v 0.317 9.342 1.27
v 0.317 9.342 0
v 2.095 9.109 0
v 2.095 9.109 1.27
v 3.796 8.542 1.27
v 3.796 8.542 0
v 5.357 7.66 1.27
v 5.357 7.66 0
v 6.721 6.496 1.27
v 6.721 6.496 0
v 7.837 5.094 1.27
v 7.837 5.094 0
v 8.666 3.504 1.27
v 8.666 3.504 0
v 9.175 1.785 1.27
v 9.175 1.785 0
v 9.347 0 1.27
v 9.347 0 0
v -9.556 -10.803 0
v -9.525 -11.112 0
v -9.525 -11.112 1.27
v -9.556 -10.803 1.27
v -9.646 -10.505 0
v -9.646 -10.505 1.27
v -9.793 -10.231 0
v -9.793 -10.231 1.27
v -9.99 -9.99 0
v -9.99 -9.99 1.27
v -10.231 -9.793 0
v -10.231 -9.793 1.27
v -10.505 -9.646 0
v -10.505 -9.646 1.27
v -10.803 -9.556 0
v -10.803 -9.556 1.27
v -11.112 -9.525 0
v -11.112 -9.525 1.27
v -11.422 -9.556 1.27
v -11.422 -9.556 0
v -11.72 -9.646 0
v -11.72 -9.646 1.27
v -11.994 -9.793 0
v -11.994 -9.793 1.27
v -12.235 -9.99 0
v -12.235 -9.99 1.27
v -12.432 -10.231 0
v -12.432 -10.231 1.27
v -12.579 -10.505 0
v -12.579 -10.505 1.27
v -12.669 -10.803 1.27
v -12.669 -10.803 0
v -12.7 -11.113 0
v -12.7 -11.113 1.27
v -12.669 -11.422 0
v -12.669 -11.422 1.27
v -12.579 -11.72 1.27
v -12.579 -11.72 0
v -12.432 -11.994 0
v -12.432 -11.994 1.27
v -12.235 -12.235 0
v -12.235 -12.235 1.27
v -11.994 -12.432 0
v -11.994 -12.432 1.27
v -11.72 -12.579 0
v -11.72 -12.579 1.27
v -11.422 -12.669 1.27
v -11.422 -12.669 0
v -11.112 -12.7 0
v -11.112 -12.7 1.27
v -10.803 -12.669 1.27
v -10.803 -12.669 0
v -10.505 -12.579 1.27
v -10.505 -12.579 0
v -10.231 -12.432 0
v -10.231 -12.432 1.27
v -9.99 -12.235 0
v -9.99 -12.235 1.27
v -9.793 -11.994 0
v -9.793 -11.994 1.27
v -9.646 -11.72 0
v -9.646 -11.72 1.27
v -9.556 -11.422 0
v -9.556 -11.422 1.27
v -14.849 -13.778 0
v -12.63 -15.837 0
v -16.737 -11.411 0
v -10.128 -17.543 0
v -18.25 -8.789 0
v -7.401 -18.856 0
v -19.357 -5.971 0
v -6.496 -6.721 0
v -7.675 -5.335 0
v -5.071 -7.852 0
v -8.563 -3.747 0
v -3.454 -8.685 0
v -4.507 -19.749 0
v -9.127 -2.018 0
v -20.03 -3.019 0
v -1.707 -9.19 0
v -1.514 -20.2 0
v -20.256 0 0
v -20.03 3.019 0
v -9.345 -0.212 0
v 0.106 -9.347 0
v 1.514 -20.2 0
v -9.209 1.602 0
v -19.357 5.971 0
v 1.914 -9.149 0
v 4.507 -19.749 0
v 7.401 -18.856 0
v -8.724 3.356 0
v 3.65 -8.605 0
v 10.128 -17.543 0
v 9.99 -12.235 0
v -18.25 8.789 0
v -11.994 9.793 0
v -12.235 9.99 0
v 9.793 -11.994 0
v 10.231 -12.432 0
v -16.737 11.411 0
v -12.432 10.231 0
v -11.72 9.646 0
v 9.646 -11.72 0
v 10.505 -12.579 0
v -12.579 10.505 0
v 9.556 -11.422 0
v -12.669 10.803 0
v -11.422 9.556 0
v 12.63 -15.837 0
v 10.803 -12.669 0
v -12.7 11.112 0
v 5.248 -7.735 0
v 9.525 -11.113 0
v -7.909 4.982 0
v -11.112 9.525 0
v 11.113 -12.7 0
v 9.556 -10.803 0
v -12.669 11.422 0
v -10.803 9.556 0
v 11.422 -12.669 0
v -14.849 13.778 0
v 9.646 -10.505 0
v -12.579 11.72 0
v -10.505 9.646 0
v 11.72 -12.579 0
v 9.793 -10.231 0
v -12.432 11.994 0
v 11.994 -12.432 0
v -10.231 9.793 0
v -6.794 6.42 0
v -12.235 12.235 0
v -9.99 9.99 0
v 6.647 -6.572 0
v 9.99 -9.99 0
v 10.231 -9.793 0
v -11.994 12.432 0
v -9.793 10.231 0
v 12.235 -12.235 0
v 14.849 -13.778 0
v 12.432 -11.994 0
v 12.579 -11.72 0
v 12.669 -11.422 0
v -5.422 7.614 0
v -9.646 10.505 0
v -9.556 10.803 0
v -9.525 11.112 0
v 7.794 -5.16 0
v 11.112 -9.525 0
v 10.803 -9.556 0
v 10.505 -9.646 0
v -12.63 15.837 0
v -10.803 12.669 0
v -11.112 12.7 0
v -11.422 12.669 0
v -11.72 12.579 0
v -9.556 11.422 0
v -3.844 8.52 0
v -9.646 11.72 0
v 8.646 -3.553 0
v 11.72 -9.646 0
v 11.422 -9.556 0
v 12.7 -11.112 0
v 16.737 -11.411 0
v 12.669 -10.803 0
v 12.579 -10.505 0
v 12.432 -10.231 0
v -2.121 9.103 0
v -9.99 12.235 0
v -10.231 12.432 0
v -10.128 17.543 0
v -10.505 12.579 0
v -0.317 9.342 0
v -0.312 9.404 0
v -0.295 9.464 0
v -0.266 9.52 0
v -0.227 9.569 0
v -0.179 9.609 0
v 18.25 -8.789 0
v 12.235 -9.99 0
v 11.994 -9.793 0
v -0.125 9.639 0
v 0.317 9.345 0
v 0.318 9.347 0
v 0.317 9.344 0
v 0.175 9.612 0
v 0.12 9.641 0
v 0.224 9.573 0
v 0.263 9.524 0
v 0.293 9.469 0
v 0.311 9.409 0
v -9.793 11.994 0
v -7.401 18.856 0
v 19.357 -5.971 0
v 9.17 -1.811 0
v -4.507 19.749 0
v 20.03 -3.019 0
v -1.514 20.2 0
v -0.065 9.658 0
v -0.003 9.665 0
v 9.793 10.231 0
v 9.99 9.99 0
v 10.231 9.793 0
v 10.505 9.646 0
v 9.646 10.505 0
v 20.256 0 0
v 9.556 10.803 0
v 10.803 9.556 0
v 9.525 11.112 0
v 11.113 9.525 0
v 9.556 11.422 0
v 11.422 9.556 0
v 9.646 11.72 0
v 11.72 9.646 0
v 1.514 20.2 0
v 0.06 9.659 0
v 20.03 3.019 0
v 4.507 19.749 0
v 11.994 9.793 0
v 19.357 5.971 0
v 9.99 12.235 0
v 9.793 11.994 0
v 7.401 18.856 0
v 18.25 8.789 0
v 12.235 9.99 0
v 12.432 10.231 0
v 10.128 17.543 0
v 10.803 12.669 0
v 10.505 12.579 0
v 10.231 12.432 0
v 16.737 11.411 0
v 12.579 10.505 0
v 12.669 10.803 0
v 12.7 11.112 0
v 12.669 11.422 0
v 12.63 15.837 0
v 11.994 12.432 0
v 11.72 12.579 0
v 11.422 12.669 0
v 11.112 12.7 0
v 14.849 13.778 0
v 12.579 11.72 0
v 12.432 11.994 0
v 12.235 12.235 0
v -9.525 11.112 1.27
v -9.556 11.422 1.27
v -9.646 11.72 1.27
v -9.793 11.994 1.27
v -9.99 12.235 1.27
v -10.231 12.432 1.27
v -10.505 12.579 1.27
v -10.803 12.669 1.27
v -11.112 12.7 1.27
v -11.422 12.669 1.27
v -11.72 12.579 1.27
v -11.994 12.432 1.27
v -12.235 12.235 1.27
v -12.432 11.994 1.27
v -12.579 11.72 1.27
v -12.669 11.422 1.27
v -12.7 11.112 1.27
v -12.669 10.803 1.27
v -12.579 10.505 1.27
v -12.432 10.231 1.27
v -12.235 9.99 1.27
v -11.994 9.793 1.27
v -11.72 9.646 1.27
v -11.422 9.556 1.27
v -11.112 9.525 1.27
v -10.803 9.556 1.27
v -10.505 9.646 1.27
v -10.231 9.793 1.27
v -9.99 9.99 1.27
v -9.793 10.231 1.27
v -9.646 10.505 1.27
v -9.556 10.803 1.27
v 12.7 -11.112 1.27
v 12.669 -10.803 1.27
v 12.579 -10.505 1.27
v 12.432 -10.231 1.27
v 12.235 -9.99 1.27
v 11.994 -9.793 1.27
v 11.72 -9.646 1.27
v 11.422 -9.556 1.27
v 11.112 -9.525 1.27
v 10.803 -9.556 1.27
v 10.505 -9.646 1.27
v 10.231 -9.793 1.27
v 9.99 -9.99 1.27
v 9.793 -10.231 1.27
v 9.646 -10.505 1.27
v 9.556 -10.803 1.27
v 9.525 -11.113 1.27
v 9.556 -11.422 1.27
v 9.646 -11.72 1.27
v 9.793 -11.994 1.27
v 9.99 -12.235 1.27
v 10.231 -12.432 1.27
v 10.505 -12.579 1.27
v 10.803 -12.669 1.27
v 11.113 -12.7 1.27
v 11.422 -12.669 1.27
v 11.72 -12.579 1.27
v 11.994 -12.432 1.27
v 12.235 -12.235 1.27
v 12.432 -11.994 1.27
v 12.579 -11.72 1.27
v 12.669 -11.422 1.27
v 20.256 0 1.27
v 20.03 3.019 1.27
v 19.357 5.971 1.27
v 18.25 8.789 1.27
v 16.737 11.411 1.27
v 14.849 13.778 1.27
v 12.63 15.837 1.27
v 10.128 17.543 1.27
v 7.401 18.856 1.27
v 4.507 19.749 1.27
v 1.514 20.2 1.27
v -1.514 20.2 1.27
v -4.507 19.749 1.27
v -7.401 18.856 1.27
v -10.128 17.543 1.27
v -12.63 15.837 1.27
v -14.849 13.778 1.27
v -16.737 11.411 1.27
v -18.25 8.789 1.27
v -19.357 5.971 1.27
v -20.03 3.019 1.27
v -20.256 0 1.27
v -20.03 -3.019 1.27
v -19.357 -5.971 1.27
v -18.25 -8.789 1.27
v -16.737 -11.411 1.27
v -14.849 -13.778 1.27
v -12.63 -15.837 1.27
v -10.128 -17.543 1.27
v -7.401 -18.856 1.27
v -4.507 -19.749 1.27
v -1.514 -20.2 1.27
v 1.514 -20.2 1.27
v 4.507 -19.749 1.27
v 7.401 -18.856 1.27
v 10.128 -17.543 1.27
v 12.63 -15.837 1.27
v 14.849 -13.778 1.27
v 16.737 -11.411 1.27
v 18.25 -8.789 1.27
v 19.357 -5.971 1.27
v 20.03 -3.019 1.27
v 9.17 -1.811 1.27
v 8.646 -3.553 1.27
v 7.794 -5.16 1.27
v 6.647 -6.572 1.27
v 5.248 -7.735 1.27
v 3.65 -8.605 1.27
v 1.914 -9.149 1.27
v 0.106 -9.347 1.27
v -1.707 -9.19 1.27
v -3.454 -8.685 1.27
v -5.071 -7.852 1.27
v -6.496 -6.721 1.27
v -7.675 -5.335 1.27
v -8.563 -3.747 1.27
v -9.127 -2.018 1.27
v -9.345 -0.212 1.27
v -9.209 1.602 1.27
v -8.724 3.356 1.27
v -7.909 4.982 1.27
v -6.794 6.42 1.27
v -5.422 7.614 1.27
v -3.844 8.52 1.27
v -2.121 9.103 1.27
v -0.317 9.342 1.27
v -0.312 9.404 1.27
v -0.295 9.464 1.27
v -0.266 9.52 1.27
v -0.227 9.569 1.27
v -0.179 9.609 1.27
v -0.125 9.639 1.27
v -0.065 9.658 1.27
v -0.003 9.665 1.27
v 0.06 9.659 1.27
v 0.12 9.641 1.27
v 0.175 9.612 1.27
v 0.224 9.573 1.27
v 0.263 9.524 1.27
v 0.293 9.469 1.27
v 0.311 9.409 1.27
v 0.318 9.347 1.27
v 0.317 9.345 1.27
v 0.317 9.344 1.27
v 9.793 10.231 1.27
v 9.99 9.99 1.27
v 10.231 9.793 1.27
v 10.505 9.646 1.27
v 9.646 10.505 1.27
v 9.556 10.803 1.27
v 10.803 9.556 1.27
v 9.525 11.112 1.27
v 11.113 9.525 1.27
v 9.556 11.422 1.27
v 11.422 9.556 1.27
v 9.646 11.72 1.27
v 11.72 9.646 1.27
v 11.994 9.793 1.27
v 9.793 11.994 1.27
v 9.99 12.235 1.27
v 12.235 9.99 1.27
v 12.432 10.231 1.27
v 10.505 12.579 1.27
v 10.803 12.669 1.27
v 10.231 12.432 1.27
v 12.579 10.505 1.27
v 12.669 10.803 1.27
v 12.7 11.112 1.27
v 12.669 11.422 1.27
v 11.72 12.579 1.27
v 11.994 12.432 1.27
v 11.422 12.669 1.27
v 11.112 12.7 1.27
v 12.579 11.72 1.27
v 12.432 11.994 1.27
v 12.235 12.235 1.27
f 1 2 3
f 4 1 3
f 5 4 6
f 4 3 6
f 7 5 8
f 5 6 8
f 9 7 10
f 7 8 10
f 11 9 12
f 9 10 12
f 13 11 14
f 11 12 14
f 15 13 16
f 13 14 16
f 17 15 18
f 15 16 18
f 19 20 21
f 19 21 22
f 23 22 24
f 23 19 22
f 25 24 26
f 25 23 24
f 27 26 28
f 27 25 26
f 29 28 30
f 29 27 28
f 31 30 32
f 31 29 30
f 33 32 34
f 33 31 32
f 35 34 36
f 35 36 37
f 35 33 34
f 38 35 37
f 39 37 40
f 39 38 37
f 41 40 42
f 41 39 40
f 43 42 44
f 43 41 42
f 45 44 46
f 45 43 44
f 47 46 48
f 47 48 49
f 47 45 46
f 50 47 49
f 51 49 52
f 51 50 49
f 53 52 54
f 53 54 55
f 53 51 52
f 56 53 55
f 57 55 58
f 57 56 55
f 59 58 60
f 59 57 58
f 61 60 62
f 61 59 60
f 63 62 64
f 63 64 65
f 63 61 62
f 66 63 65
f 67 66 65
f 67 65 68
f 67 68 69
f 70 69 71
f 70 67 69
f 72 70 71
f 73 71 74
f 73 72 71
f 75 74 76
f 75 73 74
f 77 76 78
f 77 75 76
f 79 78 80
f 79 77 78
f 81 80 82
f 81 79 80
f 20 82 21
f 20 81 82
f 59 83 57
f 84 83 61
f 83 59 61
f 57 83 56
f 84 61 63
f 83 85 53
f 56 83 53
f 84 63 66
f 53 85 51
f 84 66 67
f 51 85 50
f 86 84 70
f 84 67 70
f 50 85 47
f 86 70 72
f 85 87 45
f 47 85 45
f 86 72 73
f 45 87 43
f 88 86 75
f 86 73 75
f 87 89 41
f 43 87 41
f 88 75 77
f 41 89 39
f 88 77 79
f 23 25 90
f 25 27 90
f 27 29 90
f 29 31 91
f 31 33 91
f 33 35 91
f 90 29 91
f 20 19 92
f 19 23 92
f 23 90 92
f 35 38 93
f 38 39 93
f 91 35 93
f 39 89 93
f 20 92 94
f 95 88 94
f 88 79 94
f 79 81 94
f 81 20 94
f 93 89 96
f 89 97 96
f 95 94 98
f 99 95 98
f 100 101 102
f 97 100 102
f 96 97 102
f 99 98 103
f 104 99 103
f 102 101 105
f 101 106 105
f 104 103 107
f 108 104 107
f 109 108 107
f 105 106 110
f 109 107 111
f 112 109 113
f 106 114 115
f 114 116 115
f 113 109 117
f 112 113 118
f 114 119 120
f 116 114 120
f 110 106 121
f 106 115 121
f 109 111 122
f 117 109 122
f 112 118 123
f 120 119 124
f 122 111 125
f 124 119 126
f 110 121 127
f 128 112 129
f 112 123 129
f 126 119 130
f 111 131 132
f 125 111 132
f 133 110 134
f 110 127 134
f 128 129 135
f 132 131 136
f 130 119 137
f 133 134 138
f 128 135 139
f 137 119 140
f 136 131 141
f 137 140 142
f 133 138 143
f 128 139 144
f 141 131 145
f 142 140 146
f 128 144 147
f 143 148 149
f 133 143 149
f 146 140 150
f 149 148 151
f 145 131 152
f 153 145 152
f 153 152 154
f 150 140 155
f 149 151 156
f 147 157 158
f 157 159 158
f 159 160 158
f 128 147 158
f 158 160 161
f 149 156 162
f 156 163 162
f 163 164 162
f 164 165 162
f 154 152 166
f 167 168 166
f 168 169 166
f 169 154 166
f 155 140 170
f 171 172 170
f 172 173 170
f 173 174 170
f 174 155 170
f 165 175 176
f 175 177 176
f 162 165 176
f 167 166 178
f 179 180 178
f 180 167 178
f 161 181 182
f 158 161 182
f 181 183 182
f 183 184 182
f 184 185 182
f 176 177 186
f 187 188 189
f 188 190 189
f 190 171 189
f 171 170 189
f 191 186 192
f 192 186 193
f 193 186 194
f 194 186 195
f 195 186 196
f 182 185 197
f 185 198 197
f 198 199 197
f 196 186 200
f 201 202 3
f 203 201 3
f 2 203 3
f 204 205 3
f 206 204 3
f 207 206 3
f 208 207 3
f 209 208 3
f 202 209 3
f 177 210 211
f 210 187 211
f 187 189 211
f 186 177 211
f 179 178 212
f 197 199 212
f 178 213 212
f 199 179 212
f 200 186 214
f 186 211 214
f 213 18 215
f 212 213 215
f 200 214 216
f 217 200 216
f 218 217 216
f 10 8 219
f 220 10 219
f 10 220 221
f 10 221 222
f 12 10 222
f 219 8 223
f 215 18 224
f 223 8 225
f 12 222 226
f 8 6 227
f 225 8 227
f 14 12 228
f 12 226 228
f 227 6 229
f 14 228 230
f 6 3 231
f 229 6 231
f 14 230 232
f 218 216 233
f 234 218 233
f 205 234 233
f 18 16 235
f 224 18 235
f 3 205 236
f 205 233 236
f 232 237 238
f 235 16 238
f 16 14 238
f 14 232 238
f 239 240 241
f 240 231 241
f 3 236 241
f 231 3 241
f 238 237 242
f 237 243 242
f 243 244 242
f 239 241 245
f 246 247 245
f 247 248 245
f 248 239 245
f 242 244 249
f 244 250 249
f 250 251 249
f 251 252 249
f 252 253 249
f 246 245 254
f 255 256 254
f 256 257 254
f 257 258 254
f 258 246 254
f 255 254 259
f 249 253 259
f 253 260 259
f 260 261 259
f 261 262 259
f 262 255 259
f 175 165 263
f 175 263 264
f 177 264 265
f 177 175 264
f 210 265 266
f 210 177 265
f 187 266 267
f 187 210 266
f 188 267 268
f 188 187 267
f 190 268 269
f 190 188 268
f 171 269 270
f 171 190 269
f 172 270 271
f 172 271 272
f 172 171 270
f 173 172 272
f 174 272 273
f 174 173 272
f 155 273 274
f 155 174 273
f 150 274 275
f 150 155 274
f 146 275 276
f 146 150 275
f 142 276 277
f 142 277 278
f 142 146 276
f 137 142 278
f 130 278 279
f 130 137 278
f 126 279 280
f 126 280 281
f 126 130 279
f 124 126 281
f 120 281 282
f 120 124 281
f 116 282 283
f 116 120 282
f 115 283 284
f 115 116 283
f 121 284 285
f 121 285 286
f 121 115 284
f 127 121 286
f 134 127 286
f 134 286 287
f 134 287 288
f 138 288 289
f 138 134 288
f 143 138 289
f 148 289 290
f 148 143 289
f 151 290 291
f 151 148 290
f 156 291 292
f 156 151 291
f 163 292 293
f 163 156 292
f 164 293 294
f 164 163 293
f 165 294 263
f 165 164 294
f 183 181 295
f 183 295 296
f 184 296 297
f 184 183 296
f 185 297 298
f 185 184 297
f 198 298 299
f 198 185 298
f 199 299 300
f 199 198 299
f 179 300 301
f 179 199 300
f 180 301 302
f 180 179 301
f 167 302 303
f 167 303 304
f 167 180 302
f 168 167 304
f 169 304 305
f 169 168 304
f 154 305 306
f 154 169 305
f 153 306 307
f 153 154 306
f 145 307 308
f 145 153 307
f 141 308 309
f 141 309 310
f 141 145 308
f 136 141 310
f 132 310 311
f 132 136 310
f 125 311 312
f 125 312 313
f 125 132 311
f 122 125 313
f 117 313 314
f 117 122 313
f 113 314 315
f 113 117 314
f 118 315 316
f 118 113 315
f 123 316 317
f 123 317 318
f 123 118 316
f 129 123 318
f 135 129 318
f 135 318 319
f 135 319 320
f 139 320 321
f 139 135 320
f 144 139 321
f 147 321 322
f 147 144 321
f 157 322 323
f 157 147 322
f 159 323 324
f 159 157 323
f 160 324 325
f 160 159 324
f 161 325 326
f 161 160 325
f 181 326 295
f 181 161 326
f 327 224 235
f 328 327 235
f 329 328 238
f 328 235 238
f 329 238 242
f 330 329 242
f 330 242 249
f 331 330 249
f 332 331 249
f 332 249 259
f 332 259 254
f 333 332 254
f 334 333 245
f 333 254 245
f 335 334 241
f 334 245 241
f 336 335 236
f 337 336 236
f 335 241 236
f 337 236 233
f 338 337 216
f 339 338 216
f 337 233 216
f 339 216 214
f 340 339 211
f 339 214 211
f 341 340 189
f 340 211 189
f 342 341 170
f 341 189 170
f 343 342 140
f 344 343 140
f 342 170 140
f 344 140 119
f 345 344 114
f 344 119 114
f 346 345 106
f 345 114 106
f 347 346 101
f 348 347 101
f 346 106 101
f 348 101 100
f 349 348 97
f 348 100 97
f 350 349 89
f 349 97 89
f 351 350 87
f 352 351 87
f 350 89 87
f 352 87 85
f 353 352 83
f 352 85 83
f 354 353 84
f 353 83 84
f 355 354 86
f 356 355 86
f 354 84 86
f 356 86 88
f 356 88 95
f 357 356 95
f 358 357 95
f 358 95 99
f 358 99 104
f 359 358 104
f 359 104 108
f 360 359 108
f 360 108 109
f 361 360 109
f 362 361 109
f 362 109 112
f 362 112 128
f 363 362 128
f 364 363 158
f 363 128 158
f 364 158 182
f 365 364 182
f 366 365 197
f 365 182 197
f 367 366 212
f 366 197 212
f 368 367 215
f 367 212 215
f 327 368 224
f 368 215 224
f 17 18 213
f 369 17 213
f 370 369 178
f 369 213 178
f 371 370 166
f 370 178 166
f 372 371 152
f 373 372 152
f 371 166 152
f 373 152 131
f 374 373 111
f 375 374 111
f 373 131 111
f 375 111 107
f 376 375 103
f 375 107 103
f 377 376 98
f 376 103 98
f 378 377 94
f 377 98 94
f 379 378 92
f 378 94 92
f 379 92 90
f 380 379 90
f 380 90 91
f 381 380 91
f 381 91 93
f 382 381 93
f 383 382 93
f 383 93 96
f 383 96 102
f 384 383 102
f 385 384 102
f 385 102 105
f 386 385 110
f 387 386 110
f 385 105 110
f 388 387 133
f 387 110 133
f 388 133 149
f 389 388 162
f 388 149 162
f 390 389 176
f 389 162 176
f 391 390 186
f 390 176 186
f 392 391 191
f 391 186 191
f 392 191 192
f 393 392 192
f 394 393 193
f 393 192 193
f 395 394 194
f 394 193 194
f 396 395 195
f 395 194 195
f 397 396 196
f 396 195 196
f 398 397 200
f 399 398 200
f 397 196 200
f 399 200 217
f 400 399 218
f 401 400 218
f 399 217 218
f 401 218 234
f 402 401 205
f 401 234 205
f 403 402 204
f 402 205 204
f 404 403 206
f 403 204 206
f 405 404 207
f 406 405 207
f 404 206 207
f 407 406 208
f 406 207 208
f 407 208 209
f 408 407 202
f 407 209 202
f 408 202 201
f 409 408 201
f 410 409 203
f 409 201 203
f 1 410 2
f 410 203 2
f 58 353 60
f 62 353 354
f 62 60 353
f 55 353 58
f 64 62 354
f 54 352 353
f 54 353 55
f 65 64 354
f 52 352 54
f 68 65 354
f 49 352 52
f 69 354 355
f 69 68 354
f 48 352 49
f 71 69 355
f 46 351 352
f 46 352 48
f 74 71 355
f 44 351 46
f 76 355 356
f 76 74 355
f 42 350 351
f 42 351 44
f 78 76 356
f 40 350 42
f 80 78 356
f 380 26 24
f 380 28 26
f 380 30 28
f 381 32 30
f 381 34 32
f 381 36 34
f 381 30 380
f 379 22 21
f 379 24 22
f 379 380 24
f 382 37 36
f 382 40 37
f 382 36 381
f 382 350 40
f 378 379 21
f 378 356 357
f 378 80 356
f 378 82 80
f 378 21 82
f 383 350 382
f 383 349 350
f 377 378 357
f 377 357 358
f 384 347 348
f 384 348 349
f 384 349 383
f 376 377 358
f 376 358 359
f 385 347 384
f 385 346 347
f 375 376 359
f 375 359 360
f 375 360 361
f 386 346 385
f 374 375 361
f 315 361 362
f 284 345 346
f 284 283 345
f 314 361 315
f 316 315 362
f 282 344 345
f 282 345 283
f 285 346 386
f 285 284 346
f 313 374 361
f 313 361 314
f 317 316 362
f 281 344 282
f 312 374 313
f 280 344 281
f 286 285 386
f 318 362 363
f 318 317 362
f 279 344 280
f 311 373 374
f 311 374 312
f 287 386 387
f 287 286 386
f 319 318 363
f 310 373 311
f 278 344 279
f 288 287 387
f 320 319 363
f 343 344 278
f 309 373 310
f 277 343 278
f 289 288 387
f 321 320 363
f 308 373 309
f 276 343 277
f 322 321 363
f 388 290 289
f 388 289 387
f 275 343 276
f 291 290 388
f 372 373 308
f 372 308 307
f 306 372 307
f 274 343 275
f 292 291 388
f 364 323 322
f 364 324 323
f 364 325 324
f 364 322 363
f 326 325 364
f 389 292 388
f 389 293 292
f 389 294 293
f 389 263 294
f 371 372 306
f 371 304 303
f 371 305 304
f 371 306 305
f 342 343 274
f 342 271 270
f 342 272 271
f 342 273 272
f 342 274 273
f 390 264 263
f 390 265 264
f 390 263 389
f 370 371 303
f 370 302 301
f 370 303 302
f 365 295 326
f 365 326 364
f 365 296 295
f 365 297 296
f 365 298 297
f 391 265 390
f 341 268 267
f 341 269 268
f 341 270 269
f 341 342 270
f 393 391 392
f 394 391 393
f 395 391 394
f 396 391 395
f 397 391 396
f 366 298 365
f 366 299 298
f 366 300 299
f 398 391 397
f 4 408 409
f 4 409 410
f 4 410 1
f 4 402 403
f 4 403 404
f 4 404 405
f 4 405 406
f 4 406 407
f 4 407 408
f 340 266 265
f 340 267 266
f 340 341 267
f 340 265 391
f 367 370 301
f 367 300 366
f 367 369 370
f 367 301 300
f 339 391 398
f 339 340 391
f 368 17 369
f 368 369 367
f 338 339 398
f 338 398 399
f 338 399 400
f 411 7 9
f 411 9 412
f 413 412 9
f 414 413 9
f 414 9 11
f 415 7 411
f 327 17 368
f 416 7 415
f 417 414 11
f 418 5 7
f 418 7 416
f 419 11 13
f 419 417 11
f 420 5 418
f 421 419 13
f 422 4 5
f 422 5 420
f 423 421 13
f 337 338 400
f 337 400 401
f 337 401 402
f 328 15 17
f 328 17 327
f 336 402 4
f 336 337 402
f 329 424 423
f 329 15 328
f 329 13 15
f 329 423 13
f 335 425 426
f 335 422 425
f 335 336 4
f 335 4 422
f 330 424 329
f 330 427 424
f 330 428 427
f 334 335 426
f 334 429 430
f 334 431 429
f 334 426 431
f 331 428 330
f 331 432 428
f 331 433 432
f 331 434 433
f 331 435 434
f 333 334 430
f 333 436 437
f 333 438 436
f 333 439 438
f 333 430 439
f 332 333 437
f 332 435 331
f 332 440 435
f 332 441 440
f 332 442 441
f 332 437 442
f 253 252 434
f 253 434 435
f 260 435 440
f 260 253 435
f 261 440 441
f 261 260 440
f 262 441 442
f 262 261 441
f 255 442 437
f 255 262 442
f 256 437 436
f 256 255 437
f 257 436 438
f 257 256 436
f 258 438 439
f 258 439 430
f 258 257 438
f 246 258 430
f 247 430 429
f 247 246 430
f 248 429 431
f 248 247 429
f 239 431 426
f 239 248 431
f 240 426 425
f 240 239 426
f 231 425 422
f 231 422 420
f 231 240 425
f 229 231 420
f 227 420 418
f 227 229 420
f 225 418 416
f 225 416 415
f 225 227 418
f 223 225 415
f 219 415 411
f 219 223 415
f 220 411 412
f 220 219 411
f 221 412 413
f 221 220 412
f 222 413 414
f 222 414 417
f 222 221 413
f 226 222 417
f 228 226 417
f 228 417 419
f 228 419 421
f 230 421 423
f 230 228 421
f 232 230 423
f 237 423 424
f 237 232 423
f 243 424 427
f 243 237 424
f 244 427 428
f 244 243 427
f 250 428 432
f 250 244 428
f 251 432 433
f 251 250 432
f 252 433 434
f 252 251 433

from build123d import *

# Parameters (mm, degrees)
F0_R     = 20.2565
F0_R_2   = 1.5875
F1_DEPTH = 1.27


with BuildPart() as f1:
    # F0 (on Top) → F1 (new body)
    with BuildSketch(Plane.XY):
        Circle(F0_R)
        with Locations((-11.1125, -11.1125)):
            Circle(F0_R_2, mode=Mode.SUBTRACT)
        with Locations((11.1125, -11.1125)):
            Circle(F0_R_2, mode=Mode.SUBTRACT)
        with Locations((-11.1125, 11.1125)):
            Circle(F0_R_2, mode=Mode.SUBTRACT)
        with BuildLine():
            ThreePointArc((0.317454, 9.341808), (6.720768, 6.496262), (9.3472, 0))
            ThreePointArc((9.3472, 0), (-6.496262, -6.720768), (-0.317454, 9.341808))
            ThreePointArc((-0.317454, 9.341808), (-0.002696, 9.664689), (0.3175, 9.3472))
            ThreePointArc((0.3175, 9.3472), (0.317489, 9.344504), (0.317454, 9.341808))
        make_face(mode=Mode.SUBTRACT)
        with Locations((11.1125, 11.1125)):
            Circle(F0_R_2, mode=Mode.SUBTRACT)
    extrude(amount=F1_DEPTH)


solid = f1.part
